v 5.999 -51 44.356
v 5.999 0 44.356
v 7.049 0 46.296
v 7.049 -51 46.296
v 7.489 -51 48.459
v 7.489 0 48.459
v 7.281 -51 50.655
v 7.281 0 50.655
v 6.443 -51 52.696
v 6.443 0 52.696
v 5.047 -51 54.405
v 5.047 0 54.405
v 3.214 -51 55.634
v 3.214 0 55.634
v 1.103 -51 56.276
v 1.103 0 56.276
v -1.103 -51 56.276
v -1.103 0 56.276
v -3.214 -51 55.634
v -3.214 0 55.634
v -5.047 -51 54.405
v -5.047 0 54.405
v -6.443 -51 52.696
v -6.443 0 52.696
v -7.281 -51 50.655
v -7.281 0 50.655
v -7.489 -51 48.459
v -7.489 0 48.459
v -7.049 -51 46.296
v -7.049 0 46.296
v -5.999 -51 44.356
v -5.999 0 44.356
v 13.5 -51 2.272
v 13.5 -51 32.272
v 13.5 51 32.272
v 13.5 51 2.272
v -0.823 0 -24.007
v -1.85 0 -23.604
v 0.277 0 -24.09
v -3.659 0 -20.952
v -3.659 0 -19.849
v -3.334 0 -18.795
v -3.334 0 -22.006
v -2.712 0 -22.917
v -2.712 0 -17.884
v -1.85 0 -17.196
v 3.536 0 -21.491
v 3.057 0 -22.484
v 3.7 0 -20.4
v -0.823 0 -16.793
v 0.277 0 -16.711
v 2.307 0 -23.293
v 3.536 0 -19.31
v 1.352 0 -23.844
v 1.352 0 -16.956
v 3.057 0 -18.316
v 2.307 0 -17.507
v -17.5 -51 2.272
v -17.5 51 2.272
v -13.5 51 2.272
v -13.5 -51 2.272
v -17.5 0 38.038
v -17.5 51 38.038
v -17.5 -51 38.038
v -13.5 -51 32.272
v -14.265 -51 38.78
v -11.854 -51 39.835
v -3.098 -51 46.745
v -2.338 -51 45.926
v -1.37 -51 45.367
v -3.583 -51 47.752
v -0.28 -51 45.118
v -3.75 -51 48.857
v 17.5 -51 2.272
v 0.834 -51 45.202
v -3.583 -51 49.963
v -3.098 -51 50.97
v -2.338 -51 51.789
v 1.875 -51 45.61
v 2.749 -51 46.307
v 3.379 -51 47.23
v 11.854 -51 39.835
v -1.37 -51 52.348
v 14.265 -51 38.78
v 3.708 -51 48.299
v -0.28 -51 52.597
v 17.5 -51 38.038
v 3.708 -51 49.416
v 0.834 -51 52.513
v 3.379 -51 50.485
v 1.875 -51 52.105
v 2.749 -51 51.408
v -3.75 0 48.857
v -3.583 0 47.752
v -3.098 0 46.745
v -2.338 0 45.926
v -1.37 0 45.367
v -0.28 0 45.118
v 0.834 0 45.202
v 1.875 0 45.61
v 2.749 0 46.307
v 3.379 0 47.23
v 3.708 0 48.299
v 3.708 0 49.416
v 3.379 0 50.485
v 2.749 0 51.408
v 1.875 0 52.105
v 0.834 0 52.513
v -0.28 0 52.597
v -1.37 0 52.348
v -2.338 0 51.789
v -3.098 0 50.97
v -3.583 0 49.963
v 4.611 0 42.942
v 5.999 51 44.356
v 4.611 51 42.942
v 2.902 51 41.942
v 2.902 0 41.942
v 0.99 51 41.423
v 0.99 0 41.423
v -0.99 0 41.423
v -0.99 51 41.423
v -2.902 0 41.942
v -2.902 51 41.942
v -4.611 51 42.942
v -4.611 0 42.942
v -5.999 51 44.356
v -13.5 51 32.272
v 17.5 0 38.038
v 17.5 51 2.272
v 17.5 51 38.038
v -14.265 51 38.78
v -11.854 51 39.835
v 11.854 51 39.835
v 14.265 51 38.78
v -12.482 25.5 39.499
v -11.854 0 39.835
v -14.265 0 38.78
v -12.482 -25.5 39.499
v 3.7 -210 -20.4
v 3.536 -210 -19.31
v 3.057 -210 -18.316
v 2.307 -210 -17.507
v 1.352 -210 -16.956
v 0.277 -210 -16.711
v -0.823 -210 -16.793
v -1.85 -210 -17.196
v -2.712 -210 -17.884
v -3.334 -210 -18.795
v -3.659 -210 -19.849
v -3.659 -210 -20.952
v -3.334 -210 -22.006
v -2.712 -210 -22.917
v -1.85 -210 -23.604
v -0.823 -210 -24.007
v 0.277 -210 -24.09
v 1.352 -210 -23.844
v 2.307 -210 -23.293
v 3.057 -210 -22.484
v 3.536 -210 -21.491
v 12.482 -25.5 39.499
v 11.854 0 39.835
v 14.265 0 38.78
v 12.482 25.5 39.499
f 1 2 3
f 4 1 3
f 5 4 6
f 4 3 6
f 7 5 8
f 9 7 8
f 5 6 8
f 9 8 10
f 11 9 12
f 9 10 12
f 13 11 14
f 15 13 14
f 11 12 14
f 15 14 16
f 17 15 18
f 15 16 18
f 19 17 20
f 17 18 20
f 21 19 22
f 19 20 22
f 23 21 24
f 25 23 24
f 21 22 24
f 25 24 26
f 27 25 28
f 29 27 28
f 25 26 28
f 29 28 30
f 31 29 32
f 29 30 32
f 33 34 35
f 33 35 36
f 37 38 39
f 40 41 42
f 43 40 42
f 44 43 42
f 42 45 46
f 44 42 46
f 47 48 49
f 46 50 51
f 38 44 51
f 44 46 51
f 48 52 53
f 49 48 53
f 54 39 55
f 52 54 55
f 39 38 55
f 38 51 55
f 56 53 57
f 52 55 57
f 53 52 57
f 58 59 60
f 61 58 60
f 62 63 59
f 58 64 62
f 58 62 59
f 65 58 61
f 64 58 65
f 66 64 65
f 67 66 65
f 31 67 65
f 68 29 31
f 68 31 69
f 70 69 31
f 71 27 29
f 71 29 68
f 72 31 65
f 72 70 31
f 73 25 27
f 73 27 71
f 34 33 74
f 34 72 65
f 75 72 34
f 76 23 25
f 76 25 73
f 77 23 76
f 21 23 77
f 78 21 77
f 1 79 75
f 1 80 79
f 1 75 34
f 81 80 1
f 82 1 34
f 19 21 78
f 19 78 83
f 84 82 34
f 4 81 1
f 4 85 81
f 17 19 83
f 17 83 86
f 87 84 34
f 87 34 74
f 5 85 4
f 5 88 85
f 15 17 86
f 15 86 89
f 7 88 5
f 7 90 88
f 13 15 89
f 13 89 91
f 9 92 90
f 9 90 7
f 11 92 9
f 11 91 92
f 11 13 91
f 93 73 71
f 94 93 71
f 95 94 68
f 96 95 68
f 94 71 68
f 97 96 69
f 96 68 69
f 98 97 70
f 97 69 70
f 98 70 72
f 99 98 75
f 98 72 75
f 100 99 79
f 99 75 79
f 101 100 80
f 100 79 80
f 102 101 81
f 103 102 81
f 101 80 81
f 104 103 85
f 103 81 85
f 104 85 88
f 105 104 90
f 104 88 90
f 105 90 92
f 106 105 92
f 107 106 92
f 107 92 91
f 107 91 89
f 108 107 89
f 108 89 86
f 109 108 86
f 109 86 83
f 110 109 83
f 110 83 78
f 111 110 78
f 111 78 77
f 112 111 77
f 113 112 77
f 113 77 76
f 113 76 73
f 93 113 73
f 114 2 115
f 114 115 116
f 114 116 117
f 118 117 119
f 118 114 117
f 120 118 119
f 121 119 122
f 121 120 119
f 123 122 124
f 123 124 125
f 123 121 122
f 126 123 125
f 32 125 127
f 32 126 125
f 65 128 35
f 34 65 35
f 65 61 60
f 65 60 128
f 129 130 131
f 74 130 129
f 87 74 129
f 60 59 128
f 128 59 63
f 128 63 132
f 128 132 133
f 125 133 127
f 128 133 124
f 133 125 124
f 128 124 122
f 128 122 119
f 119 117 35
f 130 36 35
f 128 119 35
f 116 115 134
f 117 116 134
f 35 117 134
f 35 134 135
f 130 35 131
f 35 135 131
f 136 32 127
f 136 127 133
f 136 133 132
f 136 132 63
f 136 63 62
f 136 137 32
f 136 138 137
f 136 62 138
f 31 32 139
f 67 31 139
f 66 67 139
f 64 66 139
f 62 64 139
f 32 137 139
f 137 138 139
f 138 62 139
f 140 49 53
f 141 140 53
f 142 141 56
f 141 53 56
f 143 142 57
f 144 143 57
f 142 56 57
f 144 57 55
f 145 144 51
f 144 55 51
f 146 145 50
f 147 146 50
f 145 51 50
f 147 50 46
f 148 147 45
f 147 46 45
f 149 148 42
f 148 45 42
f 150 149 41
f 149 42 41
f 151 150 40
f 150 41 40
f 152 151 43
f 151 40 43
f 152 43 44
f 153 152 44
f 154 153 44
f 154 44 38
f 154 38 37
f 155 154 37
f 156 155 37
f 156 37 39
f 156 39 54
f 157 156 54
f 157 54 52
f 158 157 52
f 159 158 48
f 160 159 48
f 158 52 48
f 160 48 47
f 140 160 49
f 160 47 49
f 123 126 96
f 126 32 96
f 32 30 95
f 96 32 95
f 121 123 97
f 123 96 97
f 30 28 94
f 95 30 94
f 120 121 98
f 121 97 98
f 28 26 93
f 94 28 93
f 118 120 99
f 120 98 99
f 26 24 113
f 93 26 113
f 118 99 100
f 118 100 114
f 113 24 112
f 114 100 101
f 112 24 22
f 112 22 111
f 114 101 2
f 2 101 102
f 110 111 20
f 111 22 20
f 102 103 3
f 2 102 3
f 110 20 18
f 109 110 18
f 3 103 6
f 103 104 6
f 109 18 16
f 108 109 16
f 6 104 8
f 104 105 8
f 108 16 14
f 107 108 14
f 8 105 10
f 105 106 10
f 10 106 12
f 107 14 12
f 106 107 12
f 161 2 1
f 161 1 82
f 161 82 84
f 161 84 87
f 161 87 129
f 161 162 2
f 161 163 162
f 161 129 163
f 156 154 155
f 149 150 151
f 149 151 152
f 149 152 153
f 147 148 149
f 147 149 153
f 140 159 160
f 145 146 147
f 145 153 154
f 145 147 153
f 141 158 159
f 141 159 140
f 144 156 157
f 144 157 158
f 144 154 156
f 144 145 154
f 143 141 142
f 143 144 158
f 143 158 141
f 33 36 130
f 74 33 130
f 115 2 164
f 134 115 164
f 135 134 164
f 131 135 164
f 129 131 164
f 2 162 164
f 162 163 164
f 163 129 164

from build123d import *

# Parameters (mm, degrees)
F1_DEPTH = 51
F2_DEPTH = 51
F3_DEPTH = 51
F4_D     = 7.5
F0_R     = 3.7
F5_DEPTH = 210


with BuildPart() as f1:
    # F0 (on Front) → F1 (new body)
    with BuildSketch(Plane.XZ):
        with BuildLine():
            ThreePointArc((5.9987858254, 44.3558645231), (0, 41.3574829677), (-5.9987858254, 44.3558645231))
            add(Edge.make_bspline(
                [(-5.9987858254, 44.3558645231), (-8.174405062, 42.4618731386), (-12.1198014992, 39.0278600841), (-15.8422500893, 38.3441035757), (-17.5, 38.0384236262)],
                knots=[0, 0, 0, 0, 0.5545546229, 1, 1, 1, 1], degree=3))
            Line((-17.5, 38.0384236262), (-17.5, 2.2723694175))
            Line((-17.5, 2.2723694175), (-13.5, 2.2723694175))
            Line((-13.5, 2.2723694175), (-13.5, 32.2723694175))
            Line((-13.5, 32.2723694175), (13.5, 32.2723694175))
            Line((13.5, 32.2723694175), (13.5, 2.2723694175))
            Line((13.5, 2.2723694175), (17.5, 2.2723694175))
            Line((17.5, 2.2723694175), (17.5, 38.0384236262))
            add(Edge.make_bspline(
                [(5.9987858254, 44.3558645231), (8.174405062, 42.4618731386), (12.1198014992, 39.0278600841), (15.8422500893, 38.3441035757), (17.5, 38.0384236262)],
                knots=[0, 0, 0, 0, 0.5545546229, 1, 1, 1, 1], degree=3))
        make_face()
        with BuildLine():
            ThreePointArc((5.9987858254, 44.3558645231), (7.1148047651, 46.4848150275), (7.5, 48.8574829677))
            ThreePointArc((7.5, 48.8574829677), (-2.3726679402, 55.9722877328), (-5.9987858254, 44.3558645231))
            ThreePointArc((-5.9987858254, 44.3558645231), (0, 41.3574829677), (5.9987858254, 44.3558645231))
        make_face()
    extrude(amount=F1_DEPTH)

    # F0 (on Front) → F2 (join)
    with BuildSketch(Plane.XZ):
        with BuildLine():
            ThreePointArc((5.9987858254, 44.3558645231), (0, 41.3574829677), (-5.9987858254, 44.3558645231))
            add(Edge.make_bspline(
                [(-5.9987858254, 44.3558645231), (-8.174405062, 42.4618731386), (-12.1198014992, 39.0278600841), (-15.8422500893, 38.3441035757), (-17.5, 38.0384236262)],
                knots=[0, 0, 0, 0, 0.5545546229, 1, 1, 1, 1], degree=3))
            Line((-17.5, 38.0384236262), (-17.5, 2.2723694175))
            Line((-17.5, 2.2723694175), (-13.5, 2.2723694175))
            Line((-13.5, 2.2723694175), (-13.5, 32.2723694175))
            Line((-13.5, 32.2723694175), (13.5, 32.2723694175))
            Line((13.5, 32.2723694175), (13.5, 2.2723694175))
            Line((13.5, 2.2723694175), (17.5, 2.2723694175))
            Line((17.5, 2.2723694175), (17.5, 38.0384236262))
            add(Edge.make_bspline(
                [(5.9987858254, 44.3558645231), (8.174405062, 42.4618731386), (12.1198014992, 39.0278600841), (15.8422500893, 38.3441035757), (17.5, 38.0384236262)],
                knots=[0, 0, 0, 0, 0.5545546229, 1, 1, 1, 1], degree=3))
        make_face()
    extrude(amount=F2_DEPTH)

    # F0 (on Front) → F3 (join)
    with BuildSketch(Plane.XZ):
        with BuildLine():
            ThreePointArc((5.9987858254, 44.3558645231), (0, 41.3574829677), (-5.9987858254, 44.3558645231))
            add(Edge.make_bspline(
                [(-5.9987858254, 44.3558645231), (-8.174405062, 42.4618731386), (-12.1198014992, 39.0278600841), (-15.8422500893, 38.3441035757), (-17.5, 38.0384236262)],
                knots=[0, 0, 0, 0, 0.5545546229, 1, 1, 1, 1], degree=3))
            Line((-17.5, 38.0384236262), (-17.5, 2.2723694175))
            Line((-17.5, 2.2723694175), (-13.5, 2.2723694175))
            Line((-13.5, 2.2723694175), (-13.5, 32.2723694175))
            Line((-13.5, 32.2723694175), (13.5, 32.2723694175))
            Line((13.5, 32.2723694175), (13.5, 2.2723694175))
            Line((13.5, 2.2723694175), (17.5, 2.2723694175))
            Line((17.5, 2.2723694175), (17.5, 38.0384236262))
            add(Edge.make_bspline(
                [(5.9987858254, 44.3558645231), (8.174405062, 42.4618731386), (12.1198014992, 39.0278600841), (15.8422500893, 38.3441035757), (17.5, 38.0384236262)],
                knots=[0, 0, 0, 0, 0.5545546229, 1, 1, 1, 1], degree=3))
        make_face()
    extrude(amount=-F3_DEPTH)

    # F4 (through all)
    with Locations(Plane(origin=(0, 0, 0), x_dir=(1, 0, 0), z_dir=(0, 1, 0))):
        with Locations((0, -48.8574829677)):
            Hole(F4_D / 2)


with BuildPart() as f5:
    # F0 (on Front) → F5 (new body)
    with BuildSketch(Plane.XZ):
        with Locations((0, -20.4001702368)):
            Circle(F0_R)
    extrude(amount=F5_DEPTH)


solid = Compound([f1.part, f5.part])
